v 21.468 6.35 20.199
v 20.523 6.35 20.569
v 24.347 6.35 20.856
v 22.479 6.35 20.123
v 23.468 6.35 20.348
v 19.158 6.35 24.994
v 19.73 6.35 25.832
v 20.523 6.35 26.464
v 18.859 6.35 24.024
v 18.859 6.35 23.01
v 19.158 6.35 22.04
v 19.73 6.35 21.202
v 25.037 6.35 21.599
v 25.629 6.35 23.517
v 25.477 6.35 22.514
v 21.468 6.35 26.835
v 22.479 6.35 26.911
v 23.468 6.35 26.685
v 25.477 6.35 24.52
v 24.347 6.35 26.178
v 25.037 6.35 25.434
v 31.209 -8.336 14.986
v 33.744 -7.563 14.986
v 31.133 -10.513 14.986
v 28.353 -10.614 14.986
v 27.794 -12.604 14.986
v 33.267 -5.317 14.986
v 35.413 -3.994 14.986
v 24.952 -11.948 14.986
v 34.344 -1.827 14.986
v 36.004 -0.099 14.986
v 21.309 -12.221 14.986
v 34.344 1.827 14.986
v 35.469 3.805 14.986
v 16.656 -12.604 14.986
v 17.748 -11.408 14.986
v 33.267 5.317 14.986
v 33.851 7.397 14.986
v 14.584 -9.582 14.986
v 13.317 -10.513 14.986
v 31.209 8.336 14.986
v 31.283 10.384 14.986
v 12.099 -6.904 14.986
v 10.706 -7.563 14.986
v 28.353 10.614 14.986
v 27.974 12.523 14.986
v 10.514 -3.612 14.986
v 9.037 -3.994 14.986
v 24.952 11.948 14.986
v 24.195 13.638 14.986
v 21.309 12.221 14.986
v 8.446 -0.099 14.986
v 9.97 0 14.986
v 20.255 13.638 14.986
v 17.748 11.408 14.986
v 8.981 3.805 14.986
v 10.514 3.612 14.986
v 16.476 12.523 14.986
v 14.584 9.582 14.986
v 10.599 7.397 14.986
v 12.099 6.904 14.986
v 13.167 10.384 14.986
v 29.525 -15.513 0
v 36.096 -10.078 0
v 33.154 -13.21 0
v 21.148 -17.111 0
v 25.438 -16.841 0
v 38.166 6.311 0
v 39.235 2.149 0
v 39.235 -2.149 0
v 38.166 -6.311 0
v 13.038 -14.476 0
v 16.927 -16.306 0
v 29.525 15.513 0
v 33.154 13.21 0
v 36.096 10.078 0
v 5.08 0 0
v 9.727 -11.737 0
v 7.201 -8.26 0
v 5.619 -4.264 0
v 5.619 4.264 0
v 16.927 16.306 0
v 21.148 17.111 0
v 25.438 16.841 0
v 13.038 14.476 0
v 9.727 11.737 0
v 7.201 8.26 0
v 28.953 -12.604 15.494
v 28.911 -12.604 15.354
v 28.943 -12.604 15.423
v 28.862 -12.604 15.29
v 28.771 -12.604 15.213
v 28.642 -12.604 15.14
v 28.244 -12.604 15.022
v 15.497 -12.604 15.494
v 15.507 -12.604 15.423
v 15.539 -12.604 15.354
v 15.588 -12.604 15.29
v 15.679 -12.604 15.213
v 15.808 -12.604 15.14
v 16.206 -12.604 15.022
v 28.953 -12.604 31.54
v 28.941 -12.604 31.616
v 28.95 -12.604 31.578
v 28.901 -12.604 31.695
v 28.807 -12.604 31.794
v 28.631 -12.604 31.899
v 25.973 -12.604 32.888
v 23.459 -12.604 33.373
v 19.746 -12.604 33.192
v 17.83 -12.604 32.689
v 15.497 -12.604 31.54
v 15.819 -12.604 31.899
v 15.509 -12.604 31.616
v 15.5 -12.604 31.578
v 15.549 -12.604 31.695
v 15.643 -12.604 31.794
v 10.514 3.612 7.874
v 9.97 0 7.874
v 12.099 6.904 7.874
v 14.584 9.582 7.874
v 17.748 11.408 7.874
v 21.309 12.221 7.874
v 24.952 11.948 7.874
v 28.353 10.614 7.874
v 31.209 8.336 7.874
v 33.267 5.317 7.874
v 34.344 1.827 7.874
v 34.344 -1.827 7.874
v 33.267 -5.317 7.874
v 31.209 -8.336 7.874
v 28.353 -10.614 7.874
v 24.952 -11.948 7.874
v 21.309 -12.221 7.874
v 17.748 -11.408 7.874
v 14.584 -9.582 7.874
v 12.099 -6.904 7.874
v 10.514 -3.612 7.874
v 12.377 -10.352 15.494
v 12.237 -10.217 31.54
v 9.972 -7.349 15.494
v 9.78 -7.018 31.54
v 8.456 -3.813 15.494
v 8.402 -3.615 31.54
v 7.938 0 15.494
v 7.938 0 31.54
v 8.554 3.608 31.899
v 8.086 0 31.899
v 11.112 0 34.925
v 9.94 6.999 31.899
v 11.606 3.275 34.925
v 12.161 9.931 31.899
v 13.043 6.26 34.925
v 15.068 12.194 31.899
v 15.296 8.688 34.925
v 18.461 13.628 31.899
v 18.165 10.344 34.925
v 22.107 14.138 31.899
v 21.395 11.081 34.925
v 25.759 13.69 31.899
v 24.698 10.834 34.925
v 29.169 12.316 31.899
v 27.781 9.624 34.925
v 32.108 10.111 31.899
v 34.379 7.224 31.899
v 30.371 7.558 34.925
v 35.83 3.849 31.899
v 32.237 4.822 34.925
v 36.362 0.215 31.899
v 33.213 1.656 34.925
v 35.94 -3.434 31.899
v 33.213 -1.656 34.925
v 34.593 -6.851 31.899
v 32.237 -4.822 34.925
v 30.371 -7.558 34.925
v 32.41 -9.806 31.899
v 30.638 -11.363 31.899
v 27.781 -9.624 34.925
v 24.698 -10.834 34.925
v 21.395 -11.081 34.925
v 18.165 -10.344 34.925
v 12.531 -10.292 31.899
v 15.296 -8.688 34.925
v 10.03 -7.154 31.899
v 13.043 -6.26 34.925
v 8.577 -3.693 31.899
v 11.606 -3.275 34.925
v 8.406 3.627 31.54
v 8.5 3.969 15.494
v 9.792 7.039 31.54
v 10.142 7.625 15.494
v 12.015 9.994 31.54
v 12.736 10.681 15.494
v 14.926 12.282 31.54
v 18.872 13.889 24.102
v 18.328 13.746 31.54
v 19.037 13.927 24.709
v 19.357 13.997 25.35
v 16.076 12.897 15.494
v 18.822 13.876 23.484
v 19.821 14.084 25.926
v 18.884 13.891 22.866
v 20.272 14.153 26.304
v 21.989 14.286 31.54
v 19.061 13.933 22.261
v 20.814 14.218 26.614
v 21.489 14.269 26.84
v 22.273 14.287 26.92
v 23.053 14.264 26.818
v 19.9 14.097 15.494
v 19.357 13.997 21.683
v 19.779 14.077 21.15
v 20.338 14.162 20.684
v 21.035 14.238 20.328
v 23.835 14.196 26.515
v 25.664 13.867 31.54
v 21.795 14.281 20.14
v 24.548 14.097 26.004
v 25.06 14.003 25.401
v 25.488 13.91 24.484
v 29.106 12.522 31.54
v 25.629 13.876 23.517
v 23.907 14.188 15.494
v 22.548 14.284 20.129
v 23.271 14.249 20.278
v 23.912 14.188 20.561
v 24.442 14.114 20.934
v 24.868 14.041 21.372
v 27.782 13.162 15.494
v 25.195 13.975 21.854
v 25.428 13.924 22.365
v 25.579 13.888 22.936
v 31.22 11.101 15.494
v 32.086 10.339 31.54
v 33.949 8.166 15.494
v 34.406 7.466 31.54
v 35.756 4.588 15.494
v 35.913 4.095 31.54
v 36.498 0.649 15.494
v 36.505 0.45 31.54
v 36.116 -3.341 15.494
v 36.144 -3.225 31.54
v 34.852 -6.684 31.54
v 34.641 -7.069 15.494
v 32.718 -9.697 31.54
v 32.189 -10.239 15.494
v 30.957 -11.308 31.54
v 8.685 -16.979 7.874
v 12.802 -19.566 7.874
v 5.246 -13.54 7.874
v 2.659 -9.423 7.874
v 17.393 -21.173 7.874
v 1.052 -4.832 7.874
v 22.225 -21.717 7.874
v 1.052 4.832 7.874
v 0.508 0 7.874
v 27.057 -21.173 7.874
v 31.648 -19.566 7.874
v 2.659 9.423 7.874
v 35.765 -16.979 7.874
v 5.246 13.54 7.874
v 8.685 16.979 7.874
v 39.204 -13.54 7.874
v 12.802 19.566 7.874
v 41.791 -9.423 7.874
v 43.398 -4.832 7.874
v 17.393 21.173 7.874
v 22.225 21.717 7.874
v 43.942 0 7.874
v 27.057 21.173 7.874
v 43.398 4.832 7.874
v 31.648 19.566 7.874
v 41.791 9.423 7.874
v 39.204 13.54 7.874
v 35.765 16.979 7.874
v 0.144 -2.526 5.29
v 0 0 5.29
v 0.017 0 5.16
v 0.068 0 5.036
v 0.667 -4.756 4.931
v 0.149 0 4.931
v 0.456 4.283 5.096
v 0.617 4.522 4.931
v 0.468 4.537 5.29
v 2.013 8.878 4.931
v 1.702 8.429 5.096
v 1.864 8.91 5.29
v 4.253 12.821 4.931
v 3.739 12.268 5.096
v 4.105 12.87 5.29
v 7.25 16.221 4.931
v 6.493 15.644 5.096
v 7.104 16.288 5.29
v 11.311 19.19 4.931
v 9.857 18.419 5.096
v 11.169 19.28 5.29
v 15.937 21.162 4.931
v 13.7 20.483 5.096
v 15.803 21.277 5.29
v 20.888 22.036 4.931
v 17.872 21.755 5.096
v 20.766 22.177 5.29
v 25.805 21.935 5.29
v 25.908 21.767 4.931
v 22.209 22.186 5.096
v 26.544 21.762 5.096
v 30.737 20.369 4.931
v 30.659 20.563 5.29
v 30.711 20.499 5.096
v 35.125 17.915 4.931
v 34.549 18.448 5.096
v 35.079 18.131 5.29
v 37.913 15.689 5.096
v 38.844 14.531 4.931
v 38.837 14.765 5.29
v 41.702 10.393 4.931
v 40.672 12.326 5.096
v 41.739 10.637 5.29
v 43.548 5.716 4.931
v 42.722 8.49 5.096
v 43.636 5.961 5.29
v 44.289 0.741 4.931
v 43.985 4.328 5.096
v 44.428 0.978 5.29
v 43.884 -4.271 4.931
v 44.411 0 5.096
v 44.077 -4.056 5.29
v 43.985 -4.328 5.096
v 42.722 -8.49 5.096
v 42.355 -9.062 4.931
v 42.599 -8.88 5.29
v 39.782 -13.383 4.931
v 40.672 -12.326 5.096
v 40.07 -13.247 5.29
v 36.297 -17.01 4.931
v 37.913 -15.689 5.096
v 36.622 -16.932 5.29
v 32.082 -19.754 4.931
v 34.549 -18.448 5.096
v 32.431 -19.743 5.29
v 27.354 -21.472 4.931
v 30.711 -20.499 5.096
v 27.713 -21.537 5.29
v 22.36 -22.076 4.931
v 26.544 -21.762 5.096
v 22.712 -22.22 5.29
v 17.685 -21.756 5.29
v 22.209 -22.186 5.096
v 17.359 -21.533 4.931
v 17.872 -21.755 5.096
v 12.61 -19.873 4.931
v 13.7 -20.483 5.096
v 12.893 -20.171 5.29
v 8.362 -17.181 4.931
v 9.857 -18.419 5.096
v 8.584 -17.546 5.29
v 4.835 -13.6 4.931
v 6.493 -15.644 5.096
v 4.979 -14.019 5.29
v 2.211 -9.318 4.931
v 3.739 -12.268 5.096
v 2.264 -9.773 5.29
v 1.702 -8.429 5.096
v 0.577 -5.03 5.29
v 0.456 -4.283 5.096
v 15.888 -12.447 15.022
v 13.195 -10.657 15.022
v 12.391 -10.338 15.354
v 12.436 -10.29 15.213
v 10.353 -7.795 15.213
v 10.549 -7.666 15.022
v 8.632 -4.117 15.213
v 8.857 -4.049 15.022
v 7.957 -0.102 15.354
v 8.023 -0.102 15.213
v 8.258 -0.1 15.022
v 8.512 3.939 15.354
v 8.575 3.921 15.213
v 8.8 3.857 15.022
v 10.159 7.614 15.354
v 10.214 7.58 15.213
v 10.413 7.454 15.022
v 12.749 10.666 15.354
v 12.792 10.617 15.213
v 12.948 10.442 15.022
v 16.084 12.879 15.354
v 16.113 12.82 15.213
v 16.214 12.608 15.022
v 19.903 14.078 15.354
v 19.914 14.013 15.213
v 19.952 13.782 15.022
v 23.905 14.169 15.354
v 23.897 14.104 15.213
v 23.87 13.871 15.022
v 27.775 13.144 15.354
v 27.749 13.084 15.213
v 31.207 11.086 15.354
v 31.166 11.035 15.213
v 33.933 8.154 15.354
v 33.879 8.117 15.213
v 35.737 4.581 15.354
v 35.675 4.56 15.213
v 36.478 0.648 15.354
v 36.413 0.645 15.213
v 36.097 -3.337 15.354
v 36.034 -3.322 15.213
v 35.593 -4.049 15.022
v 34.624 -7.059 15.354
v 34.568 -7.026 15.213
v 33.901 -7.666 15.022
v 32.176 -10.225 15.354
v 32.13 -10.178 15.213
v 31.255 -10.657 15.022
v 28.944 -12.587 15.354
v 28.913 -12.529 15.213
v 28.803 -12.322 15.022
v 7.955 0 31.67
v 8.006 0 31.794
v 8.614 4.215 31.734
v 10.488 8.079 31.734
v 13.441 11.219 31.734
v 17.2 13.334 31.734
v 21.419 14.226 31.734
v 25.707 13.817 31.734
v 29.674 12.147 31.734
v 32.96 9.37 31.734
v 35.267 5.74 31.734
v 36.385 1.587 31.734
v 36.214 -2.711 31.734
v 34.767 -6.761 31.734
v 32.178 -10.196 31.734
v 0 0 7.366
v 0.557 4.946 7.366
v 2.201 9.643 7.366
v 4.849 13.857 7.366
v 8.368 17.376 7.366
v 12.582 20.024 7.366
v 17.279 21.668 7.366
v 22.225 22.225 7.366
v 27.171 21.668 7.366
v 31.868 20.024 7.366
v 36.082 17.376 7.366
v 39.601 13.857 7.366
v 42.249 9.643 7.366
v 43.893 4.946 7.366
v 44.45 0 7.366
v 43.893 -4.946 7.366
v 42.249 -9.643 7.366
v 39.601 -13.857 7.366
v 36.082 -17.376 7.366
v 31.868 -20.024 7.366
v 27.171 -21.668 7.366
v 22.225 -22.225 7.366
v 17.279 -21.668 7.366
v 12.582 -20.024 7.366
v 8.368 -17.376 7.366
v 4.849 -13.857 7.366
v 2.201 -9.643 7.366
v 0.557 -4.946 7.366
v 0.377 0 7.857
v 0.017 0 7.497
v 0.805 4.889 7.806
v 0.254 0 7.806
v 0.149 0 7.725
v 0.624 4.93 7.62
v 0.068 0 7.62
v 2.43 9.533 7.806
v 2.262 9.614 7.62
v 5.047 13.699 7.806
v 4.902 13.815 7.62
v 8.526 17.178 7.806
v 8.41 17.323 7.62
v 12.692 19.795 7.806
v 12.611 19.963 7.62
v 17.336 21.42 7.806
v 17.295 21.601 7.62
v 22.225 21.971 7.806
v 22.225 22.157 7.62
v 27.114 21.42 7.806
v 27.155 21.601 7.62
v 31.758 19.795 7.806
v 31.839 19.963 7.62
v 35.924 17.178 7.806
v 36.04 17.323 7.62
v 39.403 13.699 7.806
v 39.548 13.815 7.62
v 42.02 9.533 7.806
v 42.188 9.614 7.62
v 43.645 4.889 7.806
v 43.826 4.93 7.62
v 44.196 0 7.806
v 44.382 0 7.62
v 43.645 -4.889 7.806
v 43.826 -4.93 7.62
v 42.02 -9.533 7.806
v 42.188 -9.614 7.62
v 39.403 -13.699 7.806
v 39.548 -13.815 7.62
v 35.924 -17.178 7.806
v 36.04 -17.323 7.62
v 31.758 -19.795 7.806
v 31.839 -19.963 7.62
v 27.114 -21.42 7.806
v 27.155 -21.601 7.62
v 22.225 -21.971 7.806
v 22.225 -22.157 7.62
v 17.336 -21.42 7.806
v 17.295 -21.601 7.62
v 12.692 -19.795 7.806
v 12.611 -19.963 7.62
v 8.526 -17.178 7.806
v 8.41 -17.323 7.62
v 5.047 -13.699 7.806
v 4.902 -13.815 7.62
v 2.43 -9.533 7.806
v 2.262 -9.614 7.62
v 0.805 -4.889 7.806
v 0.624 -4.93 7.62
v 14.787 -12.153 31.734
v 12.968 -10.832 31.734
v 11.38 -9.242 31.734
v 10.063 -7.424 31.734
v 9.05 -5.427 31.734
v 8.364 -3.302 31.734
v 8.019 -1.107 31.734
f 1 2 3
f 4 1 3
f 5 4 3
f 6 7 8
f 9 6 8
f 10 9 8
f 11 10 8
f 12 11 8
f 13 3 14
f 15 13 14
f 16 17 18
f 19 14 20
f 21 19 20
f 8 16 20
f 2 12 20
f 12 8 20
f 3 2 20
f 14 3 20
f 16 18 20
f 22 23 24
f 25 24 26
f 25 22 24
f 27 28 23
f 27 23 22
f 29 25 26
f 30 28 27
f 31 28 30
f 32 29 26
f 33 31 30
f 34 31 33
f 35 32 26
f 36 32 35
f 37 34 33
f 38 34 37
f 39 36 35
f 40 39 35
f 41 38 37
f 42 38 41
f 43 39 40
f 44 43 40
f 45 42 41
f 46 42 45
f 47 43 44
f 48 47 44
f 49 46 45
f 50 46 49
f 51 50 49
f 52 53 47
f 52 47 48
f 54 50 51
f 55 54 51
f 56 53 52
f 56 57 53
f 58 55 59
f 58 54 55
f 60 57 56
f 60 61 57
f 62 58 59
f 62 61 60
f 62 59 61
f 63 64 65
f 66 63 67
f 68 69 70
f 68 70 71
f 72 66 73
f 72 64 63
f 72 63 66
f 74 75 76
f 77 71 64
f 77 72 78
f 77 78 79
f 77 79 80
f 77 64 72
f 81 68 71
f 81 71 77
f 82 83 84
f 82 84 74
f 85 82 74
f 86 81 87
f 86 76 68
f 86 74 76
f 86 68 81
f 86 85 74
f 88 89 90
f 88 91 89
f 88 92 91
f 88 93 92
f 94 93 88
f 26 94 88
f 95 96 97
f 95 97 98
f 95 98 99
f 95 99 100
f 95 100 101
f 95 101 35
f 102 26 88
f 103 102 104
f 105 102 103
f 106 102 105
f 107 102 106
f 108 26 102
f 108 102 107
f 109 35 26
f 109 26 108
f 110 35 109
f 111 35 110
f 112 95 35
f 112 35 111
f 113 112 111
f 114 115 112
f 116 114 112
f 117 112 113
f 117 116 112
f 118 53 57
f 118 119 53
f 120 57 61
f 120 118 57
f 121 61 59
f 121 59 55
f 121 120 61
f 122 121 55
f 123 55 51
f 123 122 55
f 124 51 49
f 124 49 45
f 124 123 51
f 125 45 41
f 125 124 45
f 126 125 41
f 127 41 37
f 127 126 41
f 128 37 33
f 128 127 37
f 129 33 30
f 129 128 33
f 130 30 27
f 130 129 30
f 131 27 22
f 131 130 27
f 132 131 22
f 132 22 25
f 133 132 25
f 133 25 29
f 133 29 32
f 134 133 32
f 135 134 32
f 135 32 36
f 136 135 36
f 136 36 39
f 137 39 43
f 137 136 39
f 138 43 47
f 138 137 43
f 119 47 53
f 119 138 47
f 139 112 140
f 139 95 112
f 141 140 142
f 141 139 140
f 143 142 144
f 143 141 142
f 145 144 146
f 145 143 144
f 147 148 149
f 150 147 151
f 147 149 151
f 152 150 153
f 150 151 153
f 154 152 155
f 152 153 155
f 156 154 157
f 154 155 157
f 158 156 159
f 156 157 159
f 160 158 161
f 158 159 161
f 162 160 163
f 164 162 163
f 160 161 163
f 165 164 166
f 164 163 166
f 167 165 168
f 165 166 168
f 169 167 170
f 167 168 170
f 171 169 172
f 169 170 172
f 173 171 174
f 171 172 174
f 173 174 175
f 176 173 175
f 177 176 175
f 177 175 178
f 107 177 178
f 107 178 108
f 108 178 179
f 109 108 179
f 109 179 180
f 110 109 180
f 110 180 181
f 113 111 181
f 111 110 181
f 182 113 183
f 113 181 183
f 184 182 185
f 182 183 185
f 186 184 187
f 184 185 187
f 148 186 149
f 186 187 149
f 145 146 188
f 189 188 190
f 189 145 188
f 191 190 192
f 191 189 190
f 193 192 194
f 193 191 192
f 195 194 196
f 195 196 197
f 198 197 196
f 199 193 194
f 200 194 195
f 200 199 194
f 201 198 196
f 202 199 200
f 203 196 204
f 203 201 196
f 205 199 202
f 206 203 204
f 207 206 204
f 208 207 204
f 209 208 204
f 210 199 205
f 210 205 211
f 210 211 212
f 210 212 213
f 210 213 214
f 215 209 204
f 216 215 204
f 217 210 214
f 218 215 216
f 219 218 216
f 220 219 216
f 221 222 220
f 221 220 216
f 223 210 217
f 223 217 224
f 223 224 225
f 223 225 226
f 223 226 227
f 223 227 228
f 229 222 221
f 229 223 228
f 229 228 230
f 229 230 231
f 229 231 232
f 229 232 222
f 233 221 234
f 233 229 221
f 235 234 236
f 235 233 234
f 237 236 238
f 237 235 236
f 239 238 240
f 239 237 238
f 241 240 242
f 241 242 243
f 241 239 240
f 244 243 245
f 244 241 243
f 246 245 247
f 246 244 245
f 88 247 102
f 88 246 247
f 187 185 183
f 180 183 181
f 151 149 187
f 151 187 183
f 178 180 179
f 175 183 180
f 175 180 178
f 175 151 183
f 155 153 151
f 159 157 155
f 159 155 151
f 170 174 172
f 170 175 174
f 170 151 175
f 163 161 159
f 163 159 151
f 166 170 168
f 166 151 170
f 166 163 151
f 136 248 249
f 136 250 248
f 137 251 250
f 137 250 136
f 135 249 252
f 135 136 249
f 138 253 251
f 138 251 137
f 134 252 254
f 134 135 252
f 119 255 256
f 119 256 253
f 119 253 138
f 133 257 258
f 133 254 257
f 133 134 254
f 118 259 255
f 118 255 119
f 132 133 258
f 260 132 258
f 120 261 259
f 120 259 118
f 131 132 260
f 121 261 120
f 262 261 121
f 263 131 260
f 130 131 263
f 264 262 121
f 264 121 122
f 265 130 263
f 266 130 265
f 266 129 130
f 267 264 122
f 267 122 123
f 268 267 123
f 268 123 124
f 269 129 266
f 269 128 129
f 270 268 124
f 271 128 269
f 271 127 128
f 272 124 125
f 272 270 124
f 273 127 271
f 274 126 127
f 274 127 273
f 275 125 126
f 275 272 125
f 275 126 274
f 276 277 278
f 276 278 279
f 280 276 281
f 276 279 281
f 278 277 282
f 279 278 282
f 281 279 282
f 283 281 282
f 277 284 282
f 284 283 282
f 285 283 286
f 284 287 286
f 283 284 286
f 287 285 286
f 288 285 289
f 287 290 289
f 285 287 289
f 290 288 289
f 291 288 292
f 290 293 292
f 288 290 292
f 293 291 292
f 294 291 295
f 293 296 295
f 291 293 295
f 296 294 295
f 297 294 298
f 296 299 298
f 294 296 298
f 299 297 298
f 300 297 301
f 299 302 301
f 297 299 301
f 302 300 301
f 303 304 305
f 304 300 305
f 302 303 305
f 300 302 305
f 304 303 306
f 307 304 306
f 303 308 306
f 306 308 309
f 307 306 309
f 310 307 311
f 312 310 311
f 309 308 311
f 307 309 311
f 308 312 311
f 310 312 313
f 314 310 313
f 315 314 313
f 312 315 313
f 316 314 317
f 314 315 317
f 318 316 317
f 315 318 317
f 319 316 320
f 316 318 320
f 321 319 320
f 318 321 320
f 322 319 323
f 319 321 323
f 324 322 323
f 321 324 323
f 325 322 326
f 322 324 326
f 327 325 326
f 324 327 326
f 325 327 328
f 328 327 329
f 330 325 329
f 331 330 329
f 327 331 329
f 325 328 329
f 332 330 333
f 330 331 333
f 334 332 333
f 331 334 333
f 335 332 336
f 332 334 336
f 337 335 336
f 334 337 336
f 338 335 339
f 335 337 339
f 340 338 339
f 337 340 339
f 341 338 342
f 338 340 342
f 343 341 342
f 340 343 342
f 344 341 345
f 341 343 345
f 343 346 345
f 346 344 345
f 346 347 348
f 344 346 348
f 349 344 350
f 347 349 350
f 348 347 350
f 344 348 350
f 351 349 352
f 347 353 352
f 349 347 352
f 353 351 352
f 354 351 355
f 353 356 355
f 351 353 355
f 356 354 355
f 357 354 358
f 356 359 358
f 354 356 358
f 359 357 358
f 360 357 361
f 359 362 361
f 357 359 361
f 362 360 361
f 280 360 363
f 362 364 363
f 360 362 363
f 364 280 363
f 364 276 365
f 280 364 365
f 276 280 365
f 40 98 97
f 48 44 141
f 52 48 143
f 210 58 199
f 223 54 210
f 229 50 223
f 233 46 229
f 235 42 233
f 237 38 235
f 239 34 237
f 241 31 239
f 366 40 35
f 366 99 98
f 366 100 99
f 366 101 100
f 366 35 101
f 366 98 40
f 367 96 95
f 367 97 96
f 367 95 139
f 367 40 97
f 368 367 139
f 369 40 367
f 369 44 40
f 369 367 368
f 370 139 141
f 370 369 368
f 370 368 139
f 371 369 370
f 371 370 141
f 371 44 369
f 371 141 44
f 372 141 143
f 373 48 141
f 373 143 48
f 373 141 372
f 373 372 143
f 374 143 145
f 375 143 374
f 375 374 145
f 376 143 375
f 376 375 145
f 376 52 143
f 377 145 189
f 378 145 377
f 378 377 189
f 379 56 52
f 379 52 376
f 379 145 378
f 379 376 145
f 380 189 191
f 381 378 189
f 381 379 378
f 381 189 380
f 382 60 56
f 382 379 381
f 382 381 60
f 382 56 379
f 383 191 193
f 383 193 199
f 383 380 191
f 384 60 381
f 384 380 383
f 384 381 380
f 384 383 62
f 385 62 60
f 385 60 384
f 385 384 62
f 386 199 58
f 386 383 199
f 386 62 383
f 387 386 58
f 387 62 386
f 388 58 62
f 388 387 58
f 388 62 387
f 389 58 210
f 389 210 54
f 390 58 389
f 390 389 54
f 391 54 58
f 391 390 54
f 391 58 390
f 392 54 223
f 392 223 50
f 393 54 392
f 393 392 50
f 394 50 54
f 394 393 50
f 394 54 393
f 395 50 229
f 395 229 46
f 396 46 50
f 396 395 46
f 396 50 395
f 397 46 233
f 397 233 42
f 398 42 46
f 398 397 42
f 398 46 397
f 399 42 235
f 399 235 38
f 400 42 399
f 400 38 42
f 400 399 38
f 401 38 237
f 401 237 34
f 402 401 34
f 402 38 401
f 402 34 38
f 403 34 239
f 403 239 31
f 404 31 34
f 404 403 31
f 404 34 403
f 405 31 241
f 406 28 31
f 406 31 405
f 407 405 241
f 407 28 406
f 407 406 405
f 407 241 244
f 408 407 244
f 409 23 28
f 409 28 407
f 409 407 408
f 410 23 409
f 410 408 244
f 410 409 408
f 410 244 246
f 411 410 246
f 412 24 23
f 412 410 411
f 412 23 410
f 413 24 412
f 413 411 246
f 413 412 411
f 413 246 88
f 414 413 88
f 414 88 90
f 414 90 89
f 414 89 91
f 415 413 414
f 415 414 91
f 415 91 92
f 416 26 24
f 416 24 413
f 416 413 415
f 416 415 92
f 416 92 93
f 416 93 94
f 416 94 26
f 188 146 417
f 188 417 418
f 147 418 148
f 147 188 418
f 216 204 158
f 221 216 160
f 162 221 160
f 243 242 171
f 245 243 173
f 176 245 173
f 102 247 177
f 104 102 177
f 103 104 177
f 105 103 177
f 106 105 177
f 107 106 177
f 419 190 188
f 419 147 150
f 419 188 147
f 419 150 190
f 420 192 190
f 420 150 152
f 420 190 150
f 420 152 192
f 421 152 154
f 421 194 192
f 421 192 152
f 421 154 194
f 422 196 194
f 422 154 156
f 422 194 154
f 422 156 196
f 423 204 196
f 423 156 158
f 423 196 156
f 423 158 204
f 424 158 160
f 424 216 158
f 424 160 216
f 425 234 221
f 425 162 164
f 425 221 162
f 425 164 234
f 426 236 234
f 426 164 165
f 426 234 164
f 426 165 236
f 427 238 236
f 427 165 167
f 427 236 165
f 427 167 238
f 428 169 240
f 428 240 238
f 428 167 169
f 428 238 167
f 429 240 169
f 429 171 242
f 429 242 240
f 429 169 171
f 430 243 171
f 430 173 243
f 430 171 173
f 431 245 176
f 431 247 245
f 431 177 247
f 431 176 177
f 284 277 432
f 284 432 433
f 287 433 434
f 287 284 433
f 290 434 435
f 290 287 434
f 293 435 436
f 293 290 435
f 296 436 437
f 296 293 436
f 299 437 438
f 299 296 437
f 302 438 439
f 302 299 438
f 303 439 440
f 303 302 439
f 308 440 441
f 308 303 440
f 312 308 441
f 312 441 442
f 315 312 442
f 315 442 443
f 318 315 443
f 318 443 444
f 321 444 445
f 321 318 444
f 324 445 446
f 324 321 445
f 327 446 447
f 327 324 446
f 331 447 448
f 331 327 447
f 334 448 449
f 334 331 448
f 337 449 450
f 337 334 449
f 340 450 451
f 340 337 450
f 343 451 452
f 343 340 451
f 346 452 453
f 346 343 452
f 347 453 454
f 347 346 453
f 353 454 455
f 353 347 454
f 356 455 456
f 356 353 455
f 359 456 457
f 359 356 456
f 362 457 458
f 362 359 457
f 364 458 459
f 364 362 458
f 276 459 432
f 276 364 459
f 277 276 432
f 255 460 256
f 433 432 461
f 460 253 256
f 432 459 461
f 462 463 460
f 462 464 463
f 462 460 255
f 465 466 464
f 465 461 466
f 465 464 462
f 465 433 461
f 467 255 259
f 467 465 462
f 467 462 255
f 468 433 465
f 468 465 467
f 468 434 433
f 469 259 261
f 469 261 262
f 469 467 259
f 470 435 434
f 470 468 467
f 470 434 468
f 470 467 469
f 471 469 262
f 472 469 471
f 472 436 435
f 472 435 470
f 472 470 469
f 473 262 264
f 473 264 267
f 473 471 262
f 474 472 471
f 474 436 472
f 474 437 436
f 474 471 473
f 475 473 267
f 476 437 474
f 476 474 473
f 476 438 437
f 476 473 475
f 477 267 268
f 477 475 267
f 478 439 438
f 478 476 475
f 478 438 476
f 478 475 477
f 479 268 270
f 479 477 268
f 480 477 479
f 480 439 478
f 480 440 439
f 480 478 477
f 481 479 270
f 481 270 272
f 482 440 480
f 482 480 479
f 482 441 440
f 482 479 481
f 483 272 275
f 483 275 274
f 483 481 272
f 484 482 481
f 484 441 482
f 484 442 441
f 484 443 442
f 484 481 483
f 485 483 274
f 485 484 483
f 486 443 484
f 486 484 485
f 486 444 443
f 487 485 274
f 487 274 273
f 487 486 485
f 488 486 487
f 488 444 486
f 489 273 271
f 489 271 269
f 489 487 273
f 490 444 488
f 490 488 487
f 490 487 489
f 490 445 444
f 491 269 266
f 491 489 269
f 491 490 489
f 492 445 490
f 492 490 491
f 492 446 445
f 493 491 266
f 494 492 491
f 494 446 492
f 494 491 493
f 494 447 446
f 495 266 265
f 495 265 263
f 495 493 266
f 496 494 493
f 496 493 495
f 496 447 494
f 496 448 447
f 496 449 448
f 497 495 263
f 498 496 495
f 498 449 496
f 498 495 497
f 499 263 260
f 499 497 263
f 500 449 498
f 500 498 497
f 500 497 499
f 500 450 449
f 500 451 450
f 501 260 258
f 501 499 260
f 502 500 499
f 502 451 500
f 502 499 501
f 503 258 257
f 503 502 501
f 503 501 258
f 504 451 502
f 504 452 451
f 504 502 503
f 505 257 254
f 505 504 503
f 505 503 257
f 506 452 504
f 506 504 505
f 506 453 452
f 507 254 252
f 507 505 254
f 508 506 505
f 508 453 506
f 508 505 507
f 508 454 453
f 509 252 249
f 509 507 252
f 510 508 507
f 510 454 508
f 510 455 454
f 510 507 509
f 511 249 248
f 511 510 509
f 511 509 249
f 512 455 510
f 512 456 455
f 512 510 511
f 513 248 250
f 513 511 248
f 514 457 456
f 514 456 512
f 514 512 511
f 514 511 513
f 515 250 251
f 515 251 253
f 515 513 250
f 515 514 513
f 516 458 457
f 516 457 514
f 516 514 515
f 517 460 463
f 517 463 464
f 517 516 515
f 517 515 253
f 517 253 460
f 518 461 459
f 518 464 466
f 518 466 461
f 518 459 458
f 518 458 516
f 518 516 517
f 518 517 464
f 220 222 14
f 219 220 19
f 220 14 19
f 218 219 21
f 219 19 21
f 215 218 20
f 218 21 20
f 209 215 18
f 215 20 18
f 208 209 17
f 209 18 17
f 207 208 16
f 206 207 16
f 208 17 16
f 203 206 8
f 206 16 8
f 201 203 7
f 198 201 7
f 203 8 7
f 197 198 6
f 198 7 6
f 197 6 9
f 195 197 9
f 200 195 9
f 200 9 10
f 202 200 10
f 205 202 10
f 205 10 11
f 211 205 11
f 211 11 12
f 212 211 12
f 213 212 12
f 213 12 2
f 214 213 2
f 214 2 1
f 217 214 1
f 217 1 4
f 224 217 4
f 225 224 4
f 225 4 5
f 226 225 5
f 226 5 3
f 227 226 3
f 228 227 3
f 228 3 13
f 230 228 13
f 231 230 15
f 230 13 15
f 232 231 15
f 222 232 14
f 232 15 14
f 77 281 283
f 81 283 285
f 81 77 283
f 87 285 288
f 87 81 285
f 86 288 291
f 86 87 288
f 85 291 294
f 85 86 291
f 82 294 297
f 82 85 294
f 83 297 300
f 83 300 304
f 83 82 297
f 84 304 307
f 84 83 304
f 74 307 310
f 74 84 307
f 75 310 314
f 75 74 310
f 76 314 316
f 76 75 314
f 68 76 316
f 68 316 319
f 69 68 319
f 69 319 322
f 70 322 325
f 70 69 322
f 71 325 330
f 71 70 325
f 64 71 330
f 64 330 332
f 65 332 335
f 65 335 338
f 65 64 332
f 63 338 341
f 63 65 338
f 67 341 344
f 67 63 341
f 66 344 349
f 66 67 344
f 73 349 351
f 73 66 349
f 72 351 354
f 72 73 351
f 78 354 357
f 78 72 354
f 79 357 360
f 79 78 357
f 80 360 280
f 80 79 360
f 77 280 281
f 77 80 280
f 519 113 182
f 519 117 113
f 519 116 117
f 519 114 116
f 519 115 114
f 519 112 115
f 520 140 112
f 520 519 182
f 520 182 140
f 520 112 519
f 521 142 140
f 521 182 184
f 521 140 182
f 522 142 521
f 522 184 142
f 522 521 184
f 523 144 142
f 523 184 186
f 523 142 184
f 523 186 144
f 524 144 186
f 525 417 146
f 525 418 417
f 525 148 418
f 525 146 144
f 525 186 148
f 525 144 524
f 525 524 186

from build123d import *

# Parameters (mm, degrees)
F2_SIZE  = 5.08
F3_SIZE  = 3.175
F4_R     = 0.508
F6_R     = 3.4036
F7_DEPTH = 25.4
F8_W     = 7.3712486774
F8_H     = 21.0607126355
F9_DEPTH = 44.4510001


with BuildPart() as f1:
    # F0 (on Front) → F1 (revolve)
    with BuildSketch(Plane.XZ):
        Polygon((0, 7.874), (0, 0), (22.225, 0), (22.225, 34.925), (7.9375, 34.925), (7.9375, 14.986), (9.9695, 14.986), (9.9695, 7.874), align=None)
    revolve(axis=Axis((22.225, 0, 17.4625), (0, 0, -1)))

    # F2
    f2_edges = [f1.edges().sort_by_distance(p)[0] for p in [
        (44.45, 0, 0),
    ]]
    chamfer(f2_edges, length=F2_SIZE)

    # F3
    f3_edges = [f1.edges().sort_by_distance(p)[0] for p in [
        (36.5125, 0, 34.925),
    ]]
    chamfer(f3_edges, length=F3_SIZE)

    # F4
    f4_edges = [f1.edges().sort_by_distance(p)[0] for p in [
        (36.5125, 0, 14.986),
        (7.9375, 0, 23.368),
        (36.5125, 0, 31.75),
        (0, 0, 6.477),
        (44.45, 0, 5.08),
        (44.45, 0, 7.874),
    ]]
    fillet(f4_edges, radius=F4_R)

    # F6 (on offset) → F7 (cut)
    with BuildSketch(Plane.XZ.offset(-6.35)):
        with Locations((22.225, 23.5167897552)):
            Circle(F6_R)
    extrude(amount=-F7_DEPTH, mode=Mode.SUBTRACT)

    # F8 (on Right) → F9 (cut, through all)
    with BuildSketch(Plane.YZ):
        with Locations((-16.2897733971, 24.8754546046)):
            Rectangle(F8_W, F8_H)
    extrude(amount=F9_DEPTH, mode=Mode.SUBTRACT)


solid = f1.part
